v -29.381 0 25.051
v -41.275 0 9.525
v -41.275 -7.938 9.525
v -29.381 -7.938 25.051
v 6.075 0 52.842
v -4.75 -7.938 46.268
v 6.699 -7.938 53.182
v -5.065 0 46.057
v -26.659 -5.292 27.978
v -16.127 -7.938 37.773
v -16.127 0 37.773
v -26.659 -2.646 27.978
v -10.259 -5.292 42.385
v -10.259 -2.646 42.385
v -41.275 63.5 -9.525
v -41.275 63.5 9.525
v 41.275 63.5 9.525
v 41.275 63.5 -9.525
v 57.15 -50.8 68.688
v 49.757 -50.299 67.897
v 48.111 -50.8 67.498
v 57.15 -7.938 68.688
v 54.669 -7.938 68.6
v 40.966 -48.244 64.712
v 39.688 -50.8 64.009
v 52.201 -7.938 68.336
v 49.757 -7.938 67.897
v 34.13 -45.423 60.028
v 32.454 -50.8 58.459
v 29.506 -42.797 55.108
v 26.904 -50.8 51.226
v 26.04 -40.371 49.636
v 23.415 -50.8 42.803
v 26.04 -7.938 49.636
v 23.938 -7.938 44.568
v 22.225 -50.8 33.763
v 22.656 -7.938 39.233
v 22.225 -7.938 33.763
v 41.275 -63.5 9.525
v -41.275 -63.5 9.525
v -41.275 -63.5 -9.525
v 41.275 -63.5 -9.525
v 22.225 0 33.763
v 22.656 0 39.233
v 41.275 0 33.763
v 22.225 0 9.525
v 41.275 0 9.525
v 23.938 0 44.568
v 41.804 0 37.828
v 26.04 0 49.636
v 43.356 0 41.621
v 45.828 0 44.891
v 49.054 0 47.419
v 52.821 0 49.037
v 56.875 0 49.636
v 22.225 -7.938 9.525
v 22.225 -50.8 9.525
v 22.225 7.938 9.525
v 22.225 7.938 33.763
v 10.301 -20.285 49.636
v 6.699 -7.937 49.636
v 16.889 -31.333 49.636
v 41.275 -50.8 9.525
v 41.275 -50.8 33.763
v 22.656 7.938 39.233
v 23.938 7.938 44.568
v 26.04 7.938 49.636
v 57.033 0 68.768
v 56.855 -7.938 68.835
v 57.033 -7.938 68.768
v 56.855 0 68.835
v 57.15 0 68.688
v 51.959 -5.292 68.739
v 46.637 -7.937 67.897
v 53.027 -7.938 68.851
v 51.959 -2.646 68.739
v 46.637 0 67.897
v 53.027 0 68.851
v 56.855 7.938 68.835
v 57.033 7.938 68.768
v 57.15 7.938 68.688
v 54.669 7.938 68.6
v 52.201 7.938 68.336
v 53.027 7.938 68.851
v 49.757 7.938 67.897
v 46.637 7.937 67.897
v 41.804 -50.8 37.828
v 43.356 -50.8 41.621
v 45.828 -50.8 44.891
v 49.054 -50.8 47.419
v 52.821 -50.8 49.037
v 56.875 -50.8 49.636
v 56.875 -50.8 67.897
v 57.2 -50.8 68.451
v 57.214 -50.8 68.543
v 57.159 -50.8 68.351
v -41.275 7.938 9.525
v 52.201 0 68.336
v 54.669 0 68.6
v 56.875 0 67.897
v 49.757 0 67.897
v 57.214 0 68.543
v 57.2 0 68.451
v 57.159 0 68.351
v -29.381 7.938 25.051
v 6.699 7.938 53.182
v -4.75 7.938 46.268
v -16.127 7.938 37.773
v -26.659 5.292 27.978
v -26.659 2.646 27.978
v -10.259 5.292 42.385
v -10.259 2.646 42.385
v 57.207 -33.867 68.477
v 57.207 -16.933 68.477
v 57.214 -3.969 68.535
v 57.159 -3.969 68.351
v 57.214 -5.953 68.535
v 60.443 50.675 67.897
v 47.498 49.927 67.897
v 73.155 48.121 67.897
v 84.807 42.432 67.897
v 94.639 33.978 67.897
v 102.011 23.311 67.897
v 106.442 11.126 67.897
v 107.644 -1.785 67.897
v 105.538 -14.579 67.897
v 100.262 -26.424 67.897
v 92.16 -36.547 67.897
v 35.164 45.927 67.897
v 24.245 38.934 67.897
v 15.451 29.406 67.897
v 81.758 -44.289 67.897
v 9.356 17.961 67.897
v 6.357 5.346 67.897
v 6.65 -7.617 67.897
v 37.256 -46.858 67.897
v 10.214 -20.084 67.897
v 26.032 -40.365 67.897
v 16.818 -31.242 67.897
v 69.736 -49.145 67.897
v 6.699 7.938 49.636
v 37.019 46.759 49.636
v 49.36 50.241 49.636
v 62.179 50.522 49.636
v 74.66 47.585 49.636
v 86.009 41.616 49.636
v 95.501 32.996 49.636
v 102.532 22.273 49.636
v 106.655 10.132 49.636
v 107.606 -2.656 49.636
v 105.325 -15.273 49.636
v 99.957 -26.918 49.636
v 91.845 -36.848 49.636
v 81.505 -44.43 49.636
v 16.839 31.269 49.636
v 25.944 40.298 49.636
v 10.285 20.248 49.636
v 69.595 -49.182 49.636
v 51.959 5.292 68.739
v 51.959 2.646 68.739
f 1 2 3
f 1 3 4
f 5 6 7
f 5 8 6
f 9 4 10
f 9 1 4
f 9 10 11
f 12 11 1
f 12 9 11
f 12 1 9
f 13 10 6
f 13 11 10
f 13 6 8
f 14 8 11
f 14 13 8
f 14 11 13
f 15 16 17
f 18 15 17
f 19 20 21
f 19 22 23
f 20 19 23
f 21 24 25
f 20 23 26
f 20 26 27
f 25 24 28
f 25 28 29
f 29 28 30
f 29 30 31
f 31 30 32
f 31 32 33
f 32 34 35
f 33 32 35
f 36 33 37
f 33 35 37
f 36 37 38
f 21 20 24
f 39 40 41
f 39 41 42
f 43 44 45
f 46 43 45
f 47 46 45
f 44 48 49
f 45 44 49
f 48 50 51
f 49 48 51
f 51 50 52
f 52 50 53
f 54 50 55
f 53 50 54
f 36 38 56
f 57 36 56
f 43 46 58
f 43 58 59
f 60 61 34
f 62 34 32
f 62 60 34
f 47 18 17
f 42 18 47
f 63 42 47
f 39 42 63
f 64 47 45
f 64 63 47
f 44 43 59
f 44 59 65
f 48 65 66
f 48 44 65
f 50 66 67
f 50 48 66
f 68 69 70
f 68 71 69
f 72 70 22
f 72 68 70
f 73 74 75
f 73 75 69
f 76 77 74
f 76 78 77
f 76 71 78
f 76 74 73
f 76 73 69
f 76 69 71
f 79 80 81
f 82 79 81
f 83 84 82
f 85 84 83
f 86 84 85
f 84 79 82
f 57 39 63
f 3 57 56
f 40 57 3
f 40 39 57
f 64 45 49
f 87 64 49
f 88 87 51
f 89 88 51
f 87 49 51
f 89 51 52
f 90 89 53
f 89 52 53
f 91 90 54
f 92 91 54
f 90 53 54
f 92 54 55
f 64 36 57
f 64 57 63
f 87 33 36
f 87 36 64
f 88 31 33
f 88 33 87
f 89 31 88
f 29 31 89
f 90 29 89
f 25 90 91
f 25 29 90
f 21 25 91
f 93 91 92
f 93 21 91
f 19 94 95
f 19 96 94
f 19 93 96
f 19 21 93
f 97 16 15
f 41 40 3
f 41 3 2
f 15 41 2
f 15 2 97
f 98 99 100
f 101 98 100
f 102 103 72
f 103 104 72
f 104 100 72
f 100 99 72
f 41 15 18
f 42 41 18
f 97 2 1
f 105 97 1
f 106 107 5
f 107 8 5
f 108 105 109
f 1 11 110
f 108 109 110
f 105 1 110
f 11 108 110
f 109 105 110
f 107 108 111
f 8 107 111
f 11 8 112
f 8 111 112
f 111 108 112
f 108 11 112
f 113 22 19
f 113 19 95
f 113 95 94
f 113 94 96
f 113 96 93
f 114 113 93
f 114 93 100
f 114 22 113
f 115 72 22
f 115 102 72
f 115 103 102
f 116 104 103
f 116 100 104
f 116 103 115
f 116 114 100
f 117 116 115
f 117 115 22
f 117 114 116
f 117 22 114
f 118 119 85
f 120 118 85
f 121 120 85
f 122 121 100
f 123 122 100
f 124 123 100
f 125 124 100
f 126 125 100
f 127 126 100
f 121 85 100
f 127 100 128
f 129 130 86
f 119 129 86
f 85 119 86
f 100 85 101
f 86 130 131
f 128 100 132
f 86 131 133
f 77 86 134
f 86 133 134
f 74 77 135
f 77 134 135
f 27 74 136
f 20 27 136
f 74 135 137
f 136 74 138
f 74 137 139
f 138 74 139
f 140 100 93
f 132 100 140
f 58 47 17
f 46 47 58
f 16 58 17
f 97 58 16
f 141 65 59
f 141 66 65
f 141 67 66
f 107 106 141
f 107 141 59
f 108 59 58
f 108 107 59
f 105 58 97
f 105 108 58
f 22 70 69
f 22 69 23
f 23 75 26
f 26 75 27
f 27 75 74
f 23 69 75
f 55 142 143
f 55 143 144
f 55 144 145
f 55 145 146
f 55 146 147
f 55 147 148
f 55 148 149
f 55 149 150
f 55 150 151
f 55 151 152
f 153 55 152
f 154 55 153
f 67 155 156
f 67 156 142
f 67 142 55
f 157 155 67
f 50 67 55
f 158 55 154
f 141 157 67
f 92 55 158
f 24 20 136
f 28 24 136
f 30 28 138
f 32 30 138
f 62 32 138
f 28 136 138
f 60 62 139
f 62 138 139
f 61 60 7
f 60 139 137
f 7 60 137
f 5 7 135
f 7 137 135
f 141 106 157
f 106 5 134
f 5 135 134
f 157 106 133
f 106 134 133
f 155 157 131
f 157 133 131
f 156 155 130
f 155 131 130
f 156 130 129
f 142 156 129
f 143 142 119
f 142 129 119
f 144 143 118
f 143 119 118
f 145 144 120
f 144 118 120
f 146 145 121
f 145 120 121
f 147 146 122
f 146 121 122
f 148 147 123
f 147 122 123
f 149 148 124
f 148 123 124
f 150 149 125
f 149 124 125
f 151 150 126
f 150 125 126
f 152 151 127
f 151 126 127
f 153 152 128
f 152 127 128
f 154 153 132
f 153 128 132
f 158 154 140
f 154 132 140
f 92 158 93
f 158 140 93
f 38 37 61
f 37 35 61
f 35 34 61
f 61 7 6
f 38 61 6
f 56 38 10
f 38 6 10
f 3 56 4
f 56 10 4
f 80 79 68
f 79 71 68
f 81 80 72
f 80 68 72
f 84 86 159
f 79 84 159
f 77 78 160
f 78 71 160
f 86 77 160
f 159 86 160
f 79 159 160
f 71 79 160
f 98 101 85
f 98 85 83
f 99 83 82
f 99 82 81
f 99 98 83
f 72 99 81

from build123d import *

# Parameters (mm, degrees)
F1_DEPTH  = 63.5
F2_DEPTH  = 50.8
F3_DEPTH  = 7.9375
F2_FACE_W = 50.8
F2_FACE_H = 18.2610141082


with BuildPart() as f1:
    # F0 (on Front) → F1 (new body, symmetric)
    with BuildSketch(Plane.XZ):
        Polygon((22.225, 9.525), (-41.275, 9.525), (-41.275, -9.525), (41.275, -9.525), (41.275, 9.525), align=None)
    extrude(amount=F1_DEPTH, both=True)

    # F0 (on Front) → F2 (join)
    with BuildSketch(Plane.XZ):
        with BuildLine():
            Line((22.225, 33.7634080377), (22.225, 9.525))
            Line((22.225, 9.525), (41.275, 9.525))
            Line((41.275, 9.525), (41.275, 33.7634080377))
            ThreePointArc((41.275, 33.7634080377), (45.8279770824, 44.8911850867), (56.8753051405, 49.636031253))
            Line((56.8753051405, 49.636031253), (56.8753051405, 67.8970453611))
            add(Edge.make_bspline(
                [(57.15, 68.6884080377), (57.335632748, 68.5042193152), (57.0807165436, 68.2374790668), (56.8753051405, 67.8970453611)],
                knots=[0.9213128399, 0.9213128399, 0.9213128399, 0.9213128399, 1, 1, 1, 1], degree=3))
            ThreePointArc((57.15, 68.6884080377), (32.4542956671, 58.4591123706), (22.225, 33.7634080377))
        make_face()
    extrude(amount=F2_DEPTH)

    # F0 (on Front) → F3 (join, symmetric)
    with BuildSketch(Plane.XZ):
        with BuildLine():
            add(Edge.make_bspline(
                [(-41.275, 9.525), (-7.5919390656, 61.6845674813), (54.9765090021, 70.8449915853), (57.15, 68.6884080377)],
                knots=[0, 0, 0, 0, 0.9213128399, 0.9213128399, 0.9213128399, 0.9213128399], degree=3))
            Line((-41.275, 9.525), (22.225, 9.525))
            Line((22.225, 9.525), (22.225, 33.7634080377))
            ThreePointArc((22.225, 33.7634080377), (32.4542956671, 58.4591123706), (57.15, 68.6884080377))
        make_face()
    extrude(amount=F3_DEPTH, both=True)

    # F2_face (on face) → F4 (revolve)
    with BuildSketch(Plane(origin=(56.8753051405, -25.4, 58.7665383071), x_dir=(0, 1, 0), z_dir=(1, 0, 0))):
        Rectangle(F2_FACE_W, F2_FACE_H)
    revolve(axis=Axis((56.8753051405, 0, 58.7665383071), (0, 0, -1)))


solid = f1.part
